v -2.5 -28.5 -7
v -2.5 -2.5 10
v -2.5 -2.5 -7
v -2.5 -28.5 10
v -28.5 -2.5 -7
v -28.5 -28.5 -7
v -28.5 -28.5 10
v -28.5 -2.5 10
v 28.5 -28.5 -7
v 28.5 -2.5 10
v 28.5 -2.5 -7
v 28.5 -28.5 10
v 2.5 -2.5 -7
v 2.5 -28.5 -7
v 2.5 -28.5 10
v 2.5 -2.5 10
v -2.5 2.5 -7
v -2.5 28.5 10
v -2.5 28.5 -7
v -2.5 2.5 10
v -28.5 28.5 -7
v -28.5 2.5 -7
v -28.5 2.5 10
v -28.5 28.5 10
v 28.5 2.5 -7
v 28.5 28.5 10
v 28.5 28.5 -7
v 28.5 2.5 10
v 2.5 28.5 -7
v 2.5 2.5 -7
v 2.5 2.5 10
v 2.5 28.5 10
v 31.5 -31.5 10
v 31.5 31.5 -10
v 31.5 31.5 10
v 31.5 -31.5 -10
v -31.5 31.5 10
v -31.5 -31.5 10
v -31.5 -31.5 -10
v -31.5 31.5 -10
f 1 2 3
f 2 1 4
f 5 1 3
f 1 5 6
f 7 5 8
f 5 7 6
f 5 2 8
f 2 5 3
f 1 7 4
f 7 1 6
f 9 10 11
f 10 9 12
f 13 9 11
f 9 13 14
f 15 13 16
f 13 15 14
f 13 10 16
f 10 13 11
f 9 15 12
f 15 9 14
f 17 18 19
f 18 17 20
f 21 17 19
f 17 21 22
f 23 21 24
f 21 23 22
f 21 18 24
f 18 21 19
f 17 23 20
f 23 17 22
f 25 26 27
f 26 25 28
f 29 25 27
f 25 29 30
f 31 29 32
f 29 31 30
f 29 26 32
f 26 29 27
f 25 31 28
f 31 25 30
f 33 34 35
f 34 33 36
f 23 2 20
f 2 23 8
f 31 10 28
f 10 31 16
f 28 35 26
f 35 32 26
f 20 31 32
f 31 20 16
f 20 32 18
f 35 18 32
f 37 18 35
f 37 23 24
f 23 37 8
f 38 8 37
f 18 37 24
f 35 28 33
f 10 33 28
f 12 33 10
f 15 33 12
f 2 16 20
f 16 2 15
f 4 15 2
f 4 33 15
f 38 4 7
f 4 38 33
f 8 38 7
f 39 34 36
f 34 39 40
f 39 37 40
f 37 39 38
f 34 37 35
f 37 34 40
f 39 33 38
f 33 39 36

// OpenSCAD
$fn = 32;

// ----------------------------------------------------------------------
// Pocket plate 63 x 63 x 20
// 2 x 2 pockets 26 mm square, 17 mm deep
// ----------------------------------------------------------------------

// --- parameters (mm) ---
thickness = 20;  // plate thickness
floor_t = 3;     // material left under each pocket
pocket = 26;     // pocket side length
pitch_x = 31;    // pocket pitch along X
pitch_y = 31;    // pocket pitch along Y
cols = 2;        // pockets per row
rows = 2;        // rows of pockets

// --- derived feature positions (mm) ---
depth = thickness - floor_t;        // = 17   pocket depth, down to the floor
span_x = (cols - 1) * pitch_x;      // = 31   distance between outer pockets
span_y = (rows - 1) * pitch_y;      // = 31   distance between outer pocket rows
origin_x = -span_x / 2;             // = -15.5   X of the first pocket
origin_y = -span_y / 2;             // = -15.5   Y of the first pocket
plate = [span_x + pocket + 6, span_y + pocket + 6, thickness];  // = [63, 63, 20]   overall size: pockets plus 3 mm of wall on each side
feature_centers = [
  [origin_x + 0 * pitch_x, origin_y + 0 * pitch_y],
  [origin_x + 1 * pitch_x, origin_y + 0 * pitch_y],
  [origin_x + 0 * pitch_x, origin_y + 1 * pitch_y],
  [origin_x + 1 * pitch_x, origin_y + 1 * pitch_y]
];   // pocket centres, used verbatim by the cutter loop

// plate outline, then one pocket per centre in feature_centers
difference() {
  cube(plate, center = true);
  for (centre = feature_centers)
    translate([centre[0] - pocket / 2, centre[1] - pocket / 2, plate[2] / 2 - depth])
      cube([pocket, pocket, depth + 1]);  // centred on the declared pocket centre
}
